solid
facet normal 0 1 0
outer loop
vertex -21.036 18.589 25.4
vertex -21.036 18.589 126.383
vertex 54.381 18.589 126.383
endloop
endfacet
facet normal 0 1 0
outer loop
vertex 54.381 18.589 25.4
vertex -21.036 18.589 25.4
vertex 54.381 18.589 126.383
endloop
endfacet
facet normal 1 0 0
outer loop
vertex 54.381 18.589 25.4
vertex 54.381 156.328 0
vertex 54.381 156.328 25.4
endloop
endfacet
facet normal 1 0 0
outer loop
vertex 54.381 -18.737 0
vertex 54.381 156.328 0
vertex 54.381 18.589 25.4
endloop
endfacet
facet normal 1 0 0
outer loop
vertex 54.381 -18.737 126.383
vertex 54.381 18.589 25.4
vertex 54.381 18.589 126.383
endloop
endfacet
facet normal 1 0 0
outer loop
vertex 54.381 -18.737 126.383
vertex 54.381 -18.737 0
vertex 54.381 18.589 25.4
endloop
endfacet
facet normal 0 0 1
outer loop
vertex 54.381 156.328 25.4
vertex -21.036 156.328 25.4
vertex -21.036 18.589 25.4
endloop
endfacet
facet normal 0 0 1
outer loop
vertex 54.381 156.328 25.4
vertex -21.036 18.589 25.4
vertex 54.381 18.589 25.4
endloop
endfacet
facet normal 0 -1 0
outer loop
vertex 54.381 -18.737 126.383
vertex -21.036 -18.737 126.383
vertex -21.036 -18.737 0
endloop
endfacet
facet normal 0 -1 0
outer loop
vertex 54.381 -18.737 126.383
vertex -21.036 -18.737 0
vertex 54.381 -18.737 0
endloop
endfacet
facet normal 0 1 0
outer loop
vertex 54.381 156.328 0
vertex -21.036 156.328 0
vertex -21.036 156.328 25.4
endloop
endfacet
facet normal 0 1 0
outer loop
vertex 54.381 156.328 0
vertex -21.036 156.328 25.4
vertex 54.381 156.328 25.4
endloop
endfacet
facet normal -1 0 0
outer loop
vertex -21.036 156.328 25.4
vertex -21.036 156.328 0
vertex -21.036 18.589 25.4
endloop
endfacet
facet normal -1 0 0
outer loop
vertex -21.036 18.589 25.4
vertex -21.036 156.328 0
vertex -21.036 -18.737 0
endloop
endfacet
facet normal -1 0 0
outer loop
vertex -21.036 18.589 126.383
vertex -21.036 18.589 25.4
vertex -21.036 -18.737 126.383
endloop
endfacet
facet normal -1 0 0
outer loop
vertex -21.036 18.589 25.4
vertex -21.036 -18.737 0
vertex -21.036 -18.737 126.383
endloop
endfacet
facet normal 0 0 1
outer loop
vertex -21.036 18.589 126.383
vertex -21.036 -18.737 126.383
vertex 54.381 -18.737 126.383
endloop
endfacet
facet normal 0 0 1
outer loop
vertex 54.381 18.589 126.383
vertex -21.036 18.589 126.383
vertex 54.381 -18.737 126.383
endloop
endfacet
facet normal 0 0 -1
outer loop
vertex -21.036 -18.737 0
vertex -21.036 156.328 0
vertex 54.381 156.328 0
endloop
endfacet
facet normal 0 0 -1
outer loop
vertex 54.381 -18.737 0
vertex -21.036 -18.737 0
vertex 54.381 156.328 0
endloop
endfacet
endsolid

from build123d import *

# Parameters (mm, degrees)
F0_W     = 75.4162408412
F0_H     = 175.0652268529
F1_DEPTH = 25.4
F2_W     = 75.4162408412
F2_H     = 100.9825893402
F3_DEPTH = 37.3262315989


with BuildPart() as f1:
    # F0 (on Top) → F1 (new body)
    with BuildSketch(Plane.XY):
        with Locations((16.6725758463, 68.7957666814)):
            Rectangle(F0_W, F0_H)
    extrude(amount=F1_DEPTH)

    # F2 (on face) → F3 (join)
    with BuildSketch(Plane.XZ.offset(18.736846745)):
        with Locations((16.6725758463, 75.8912946701)):
            Rectangle(F2_W, F2_H)
    extrude(amount=-F3_DEPTH)


solid = f1.part
